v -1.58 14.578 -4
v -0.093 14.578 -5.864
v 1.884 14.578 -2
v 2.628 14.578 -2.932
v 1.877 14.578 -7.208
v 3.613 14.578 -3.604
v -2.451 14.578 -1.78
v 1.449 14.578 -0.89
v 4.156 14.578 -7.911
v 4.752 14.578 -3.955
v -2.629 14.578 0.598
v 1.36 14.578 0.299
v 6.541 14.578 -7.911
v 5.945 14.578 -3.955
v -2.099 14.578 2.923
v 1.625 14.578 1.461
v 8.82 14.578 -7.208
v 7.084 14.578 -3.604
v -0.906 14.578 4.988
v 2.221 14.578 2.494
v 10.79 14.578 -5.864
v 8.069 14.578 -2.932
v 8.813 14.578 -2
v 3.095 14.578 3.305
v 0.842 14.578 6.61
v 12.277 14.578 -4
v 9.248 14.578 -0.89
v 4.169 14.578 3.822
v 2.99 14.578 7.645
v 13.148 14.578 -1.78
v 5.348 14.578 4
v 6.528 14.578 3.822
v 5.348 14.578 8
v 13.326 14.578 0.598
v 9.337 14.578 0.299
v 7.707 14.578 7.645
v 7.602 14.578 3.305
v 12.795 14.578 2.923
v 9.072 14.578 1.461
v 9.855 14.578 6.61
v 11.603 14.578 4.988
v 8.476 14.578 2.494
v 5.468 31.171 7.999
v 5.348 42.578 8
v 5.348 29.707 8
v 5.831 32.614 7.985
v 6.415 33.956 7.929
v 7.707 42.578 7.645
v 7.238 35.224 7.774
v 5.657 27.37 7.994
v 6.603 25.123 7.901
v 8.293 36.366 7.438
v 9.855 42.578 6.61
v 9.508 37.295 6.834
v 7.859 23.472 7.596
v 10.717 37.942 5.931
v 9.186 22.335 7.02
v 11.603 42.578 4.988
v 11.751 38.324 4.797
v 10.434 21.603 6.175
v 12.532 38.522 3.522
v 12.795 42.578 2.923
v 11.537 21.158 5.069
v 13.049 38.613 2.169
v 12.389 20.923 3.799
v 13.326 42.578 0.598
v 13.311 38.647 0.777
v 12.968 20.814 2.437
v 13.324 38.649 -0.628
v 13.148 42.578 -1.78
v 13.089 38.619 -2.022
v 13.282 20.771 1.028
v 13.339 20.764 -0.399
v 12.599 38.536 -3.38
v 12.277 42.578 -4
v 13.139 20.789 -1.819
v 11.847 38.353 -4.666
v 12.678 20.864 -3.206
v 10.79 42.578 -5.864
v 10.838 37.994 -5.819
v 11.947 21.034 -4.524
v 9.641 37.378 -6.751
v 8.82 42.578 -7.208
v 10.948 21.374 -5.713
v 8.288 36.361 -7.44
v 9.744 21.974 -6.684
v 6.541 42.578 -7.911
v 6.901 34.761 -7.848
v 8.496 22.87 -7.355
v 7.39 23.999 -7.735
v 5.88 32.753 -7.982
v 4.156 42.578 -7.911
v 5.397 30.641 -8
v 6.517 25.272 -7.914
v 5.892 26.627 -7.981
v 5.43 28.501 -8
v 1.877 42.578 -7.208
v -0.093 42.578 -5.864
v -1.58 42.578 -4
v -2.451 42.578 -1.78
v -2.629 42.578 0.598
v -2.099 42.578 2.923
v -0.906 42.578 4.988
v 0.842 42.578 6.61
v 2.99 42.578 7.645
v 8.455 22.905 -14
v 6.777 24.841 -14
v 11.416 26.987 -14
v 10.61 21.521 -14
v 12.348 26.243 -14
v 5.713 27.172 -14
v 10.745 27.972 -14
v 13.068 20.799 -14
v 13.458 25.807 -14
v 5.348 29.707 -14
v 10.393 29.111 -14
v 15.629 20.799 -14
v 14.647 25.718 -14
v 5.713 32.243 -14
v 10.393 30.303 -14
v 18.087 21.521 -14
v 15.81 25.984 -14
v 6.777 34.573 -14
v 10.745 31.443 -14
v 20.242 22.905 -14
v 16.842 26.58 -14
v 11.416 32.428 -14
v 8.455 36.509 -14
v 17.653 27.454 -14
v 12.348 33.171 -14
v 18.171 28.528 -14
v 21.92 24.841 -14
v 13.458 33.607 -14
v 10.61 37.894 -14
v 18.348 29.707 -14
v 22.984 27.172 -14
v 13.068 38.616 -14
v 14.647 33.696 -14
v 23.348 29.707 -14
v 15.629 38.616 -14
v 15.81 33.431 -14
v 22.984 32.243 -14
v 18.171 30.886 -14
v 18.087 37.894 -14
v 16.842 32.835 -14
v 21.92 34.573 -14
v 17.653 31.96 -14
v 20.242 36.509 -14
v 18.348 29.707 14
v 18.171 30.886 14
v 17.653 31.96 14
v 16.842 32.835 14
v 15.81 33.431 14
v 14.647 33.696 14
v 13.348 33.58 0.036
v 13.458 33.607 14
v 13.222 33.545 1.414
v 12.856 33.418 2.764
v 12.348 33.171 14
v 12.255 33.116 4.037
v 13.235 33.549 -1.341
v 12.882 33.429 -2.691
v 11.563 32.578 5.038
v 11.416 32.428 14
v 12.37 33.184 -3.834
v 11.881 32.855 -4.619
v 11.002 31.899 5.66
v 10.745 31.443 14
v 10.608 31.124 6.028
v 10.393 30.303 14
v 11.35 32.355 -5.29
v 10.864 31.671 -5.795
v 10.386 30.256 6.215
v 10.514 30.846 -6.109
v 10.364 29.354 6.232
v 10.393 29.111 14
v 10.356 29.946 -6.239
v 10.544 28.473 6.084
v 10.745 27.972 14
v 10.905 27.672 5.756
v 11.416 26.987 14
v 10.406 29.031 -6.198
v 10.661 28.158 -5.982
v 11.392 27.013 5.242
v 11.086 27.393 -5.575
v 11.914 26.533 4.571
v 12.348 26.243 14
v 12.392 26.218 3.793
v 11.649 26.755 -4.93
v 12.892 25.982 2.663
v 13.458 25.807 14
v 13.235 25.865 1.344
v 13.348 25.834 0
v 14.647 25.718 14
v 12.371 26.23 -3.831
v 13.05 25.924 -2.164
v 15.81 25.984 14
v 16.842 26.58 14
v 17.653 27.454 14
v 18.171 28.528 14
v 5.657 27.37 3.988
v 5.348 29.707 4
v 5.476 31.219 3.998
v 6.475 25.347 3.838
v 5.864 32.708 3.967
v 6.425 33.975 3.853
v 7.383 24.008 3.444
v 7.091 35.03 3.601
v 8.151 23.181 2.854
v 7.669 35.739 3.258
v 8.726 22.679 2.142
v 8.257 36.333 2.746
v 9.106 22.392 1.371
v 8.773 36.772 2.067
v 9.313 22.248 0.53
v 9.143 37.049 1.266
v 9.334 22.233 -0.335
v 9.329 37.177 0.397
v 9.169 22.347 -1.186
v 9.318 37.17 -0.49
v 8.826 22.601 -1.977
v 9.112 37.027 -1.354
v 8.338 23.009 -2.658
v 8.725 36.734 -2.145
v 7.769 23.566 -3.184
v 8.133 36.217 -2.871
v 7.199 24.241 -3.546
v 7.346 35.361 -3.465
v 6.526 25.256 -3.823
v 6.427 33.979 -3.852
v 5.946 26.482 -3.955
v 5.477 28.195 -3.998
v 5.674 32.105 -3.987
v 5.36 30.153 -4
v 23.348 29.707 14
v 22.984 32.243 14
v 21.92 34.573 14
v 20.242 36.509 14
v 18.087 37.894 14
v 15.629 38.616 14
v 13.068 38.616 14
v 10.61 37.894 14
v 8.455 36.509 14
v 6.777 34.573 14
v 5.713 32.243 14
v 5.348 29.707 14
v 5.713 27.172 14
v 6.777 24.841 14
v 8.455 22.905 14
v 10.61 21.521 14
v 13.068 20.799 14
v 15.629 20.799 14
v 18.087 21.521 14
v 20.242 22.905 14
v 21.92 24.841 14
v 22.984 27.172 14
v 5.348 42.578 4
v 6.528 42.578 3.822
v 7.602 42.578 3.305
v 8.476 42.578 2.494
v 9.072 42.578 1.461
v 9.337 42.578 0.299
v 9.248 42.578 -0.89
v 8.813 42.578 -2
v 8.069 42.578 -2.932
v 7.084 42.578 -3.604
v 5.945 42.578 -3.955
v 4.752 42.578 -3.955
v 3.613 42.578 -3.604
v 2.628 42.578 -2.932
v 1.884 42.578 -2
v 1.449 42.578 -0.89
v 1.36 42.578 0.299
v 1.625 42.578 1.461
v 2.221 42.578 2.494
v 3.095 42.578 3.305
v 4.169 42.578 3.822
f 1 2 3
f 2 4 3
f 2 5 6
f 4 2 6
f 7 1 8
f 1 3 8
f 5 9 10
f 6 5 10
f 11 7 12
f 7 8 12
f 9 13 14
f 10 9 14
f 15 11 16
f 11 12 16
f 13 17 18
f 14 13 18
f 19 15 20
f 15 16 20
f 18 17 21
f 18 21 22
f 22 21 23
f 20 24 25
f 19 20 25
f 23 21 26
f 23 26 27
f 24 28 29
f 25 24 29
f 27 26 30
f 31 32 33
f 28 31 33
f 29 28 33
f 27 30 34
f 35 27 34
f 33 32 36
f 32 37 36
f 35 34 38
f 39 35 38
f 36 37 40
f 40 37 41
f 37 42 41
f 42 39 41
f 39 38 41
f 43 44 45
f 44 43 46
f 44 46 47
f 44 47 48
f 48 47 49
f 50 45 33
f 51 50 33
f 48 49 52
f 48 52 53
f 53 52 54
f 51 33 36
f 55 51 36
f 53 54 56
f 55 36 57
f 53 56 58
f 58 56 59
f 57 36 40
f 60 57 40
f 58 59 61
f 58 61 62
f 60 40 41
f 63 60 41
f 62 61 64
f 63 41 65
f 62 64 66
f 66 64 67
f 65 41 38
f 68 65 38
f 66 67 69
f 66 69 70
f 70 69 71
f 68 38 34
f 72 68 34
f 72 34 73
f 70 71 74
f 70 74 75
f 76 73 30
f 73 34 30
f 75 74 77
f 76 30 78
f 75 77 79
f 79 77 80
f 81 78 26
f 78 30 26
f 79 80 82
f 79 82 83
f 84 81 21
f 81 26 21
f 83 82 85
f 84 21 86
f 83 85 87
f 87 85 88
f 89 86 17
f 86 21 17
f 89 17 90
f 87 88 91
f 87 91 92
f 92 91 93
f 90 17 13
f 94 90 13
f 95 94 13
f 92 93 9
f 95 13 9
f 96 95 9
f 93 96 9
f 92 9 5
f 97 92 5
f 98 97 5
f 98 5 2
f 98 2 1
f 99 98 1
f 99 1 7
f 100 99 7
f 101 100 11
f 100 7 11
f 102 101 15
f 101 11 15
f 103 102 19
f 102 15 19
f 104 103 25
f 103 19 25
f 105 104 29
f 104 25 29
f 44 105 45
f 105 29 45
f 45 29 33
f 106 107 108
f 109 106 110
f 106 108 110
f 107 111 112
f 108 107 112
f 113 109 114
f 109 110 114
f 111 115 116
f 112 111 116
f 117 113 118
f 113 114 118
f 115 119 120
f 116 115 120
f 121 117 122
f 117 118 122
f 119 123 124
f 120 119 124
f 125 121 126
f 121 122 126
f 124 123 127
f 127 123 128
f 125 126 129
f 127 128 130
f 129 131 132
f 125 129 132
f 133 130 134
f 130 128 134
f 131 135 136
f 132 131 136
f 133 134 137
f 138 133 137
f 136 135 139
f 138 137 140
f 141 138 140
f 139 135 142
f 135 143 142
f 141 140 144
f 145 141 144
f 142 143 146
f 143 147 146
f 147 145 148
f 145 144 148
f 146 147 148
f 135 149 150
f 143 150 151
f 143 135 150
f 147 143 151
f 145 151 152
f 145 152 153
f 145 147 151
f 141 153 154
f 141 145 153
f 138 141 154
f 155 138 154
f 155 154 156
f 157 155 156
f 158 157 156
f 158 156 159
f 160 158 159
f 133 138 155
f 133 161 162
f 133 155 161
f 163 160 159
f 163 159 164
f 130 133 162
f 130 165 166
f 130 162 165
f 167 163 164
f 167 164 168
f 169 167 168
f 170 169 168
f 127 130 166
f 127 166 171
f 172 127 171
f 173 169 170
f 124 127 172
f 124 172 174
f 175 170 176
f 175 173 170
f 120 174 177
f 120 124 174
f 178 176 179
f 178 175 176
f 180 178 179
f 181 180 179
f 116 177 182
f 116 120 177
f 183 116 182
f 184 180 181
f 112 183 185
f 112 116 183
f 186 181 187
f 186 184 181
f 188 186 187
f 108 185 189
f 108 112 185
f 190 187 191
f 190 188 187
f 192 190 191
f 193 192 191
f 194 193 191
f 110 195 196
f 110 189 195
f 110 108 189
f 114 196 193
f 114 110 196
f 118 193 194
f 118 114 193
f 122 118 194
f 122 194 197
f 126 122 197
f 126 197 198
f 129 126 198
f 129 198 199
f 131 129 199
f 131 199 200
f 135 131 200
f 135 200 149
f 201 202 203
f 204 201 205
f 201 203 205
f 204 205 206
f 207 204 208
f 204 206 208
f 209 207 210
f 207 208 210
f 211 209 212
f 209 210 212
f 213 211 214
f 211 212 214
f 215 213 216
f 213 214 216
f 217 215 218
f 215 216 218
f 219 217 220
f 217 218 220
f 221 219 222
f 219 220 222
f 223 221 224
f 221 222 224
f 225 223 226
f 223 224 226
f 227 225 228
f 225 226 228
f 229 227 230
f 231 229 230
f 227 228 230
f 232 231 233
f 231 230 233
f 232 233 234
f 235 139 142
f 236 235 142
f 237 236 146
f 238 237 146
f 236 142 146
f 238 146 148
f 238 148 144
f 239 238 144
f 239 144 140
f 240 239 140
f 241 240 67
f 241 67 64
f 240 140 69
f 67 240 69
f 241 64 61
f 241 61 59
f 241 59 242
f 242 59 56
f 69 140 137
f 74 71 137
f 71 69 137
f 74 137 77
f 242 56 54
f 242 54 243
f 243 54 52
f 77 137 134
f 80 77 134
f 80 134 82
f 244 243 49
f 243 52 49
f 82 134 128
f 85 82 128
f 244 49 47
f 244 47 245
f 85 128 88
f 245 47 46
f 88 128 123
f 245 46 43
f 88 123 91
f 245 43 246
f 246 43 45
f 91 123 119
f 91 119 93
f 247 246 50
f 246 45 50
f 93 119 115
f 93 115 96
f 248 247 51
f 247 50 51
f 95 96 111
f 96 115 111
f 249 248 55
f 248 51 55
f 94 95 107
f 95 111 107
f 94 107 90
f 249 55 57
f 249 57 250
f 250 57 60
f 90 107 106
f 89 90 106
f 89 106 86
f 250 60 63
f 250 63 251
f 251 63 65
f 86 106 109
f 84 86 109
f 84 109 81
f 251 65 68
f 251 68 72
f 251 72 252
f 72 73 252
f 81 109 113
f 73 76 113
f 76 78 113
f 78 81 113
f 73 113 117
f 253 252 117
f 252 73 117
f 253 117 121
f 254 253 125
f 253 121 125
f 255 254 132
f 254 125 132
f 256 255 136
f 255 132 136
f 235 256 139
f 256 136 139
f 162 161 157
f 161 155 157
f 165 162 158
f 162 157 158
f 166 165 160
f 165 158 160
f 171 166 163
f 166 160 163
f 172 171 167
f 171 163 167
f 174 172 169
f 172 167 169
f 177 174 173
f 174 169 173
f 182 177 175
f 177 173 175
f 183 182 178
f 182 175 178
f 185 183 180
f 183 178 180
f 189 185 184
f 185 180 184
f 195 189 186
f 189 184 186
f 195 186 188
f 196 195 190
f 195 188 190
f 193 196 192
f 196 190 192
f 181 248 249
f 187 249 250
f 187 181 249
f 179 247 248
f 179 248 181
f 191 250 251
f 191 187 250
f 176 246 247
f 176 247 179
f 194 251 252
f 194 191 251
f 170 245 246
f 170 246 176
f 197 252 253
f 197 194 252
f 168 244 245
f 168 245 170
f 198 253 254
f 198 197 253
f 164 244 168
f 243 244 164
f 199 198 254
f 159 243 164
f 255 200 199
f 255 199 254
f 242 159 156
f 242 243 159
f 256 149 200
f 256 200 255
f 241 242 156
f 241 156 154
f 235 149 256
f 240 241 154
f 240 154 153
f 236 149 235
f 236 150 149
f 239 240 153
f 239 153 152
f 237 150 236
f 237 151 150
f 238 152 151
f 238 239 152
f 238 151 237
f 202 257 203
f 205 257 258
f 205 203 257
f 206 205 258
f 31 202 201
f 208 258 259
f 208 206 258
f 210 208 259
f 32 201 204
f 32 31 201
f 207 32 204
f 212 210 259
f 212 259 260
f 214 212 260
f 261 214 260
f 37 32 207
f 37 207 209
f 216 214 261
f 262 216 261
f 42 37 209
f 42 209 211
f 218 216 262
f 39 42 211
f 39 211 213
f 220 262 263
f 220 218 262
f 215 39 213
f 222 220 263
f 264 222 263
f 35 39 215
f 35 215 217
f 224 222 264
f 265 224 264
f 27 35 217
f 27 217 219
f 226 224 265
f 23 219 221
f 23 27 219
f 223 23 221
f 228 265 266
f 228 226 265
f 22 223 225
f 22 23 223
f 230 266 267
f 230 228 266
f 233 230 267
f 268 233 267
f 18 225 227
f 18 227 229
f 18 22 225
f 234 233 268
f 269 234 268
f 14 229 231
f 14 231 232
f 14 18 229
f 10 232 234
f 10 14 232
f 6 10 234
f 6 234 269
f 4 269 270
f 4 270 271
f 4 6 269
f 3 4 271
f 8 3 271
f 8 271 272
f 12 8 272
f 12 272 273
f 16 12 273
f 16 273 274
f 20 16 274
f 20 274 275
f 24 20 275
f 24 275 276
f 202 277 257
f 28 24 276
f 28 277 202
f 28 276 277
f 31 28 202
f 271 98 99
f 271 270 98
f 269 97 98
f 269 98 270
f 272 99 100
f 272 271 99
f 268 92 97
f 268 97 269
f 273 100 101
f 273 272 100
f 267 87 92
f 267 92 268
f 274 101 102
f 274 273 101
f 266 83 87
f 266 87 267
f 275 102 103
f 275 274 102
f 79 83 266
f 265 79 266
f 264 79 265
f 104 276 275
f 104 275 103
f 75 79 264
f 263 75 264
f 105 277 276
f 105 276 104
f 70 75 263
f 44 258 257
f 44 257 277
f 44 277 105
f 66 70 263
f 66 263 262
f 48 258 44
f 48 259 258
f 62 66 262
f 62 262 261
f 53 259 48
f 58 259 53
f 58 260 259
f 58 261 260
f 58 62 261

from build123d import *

# Parameters (mm, degrees)
SKETCH1_R                = 16
SKETCH1_R_2              = 8
BOSS_EXTRUDE1_DEPTH      = 56
BOSS_EXTRUDE2_DEPTH      = 28
BOSS_EXTRUDE2_DEPTH_BACK = 28
SKETCH2_R                = 18
SKETCH2_R_2              = 8
SKETCH3_R                = 8
CUT_EXTRUDE1_DEPTH       = 73.221880507
SKETCH4_R                = 8
CUT_EXTRUDE2_DEPTH       = 87.994252854
ESCALA1_SCALE            = 0.5


with BuildPart() as part:
    # Sketch1 → Boss-Extrude1 (new body)
    with BuildSketch(Plane(origin=(0, 0, 0), x_dir=(1, 0, 0), z_dir=(0, 1, 0))):
        Circle(SKETCH1_R)
        Circle(SKETCH1_R_2, mode=Mode.SUBTRACT)
    extrude(amount=BOSS_EXTRUDE1_DEPTH)

    # Sketch2 → Boss-Extrude2 (add, two sides: drawn at the far end of the back side and taken through both)
    with BuildSketch(Plane.XY.offset(-BOSS_EXTRUDE2_DEPTH_BACK)):
        with Locations((18, 30.258098715)):
            Circle(SKETCH2_R)
        with Locations((18, 30.258098715)):
            Circle(SKETCH2_R_2, mode=Mode.SUBTRACT)
    extrude(amount=BOSS_EXTRUDE2_DEPTH + BOSS_EXTRUDE2_DEPTH_BACK)

    # Sketch3 → Cut-Extrude1 (cut, through all)
    with BuildSketch(Plane(origin=(0, 56, 0), x_dir=(1, 0, 0), z_dir=(0, 1, 0))):
        Circle(SKETCH3_R)
    extrude(amount=-CUT_EXTRUDE1_DEPTH, mode=Mode.SUBTRACT)

    # Sketch4 → Cut-Extrude2 (cut, through all)
    with BuildSketch(Plane.XY.offset(28)):
        with Locations((18, 30.258098715)):
            Circle(SKETCH4_R)
    extrude(amount=-CUT_EXTRUDE2_DEPTH, mode=Mode.SUBTRACT)


with BuildPart() as part_1:
    # Escala1: scaled about (10.696798327, 29.156211429, -1.523e-06)
    add(part.part.scale(ESCALA1_SCALE).moved(Location((5.348399163, 14.578105714, -7.62e-07))))


solid = part_1.part
